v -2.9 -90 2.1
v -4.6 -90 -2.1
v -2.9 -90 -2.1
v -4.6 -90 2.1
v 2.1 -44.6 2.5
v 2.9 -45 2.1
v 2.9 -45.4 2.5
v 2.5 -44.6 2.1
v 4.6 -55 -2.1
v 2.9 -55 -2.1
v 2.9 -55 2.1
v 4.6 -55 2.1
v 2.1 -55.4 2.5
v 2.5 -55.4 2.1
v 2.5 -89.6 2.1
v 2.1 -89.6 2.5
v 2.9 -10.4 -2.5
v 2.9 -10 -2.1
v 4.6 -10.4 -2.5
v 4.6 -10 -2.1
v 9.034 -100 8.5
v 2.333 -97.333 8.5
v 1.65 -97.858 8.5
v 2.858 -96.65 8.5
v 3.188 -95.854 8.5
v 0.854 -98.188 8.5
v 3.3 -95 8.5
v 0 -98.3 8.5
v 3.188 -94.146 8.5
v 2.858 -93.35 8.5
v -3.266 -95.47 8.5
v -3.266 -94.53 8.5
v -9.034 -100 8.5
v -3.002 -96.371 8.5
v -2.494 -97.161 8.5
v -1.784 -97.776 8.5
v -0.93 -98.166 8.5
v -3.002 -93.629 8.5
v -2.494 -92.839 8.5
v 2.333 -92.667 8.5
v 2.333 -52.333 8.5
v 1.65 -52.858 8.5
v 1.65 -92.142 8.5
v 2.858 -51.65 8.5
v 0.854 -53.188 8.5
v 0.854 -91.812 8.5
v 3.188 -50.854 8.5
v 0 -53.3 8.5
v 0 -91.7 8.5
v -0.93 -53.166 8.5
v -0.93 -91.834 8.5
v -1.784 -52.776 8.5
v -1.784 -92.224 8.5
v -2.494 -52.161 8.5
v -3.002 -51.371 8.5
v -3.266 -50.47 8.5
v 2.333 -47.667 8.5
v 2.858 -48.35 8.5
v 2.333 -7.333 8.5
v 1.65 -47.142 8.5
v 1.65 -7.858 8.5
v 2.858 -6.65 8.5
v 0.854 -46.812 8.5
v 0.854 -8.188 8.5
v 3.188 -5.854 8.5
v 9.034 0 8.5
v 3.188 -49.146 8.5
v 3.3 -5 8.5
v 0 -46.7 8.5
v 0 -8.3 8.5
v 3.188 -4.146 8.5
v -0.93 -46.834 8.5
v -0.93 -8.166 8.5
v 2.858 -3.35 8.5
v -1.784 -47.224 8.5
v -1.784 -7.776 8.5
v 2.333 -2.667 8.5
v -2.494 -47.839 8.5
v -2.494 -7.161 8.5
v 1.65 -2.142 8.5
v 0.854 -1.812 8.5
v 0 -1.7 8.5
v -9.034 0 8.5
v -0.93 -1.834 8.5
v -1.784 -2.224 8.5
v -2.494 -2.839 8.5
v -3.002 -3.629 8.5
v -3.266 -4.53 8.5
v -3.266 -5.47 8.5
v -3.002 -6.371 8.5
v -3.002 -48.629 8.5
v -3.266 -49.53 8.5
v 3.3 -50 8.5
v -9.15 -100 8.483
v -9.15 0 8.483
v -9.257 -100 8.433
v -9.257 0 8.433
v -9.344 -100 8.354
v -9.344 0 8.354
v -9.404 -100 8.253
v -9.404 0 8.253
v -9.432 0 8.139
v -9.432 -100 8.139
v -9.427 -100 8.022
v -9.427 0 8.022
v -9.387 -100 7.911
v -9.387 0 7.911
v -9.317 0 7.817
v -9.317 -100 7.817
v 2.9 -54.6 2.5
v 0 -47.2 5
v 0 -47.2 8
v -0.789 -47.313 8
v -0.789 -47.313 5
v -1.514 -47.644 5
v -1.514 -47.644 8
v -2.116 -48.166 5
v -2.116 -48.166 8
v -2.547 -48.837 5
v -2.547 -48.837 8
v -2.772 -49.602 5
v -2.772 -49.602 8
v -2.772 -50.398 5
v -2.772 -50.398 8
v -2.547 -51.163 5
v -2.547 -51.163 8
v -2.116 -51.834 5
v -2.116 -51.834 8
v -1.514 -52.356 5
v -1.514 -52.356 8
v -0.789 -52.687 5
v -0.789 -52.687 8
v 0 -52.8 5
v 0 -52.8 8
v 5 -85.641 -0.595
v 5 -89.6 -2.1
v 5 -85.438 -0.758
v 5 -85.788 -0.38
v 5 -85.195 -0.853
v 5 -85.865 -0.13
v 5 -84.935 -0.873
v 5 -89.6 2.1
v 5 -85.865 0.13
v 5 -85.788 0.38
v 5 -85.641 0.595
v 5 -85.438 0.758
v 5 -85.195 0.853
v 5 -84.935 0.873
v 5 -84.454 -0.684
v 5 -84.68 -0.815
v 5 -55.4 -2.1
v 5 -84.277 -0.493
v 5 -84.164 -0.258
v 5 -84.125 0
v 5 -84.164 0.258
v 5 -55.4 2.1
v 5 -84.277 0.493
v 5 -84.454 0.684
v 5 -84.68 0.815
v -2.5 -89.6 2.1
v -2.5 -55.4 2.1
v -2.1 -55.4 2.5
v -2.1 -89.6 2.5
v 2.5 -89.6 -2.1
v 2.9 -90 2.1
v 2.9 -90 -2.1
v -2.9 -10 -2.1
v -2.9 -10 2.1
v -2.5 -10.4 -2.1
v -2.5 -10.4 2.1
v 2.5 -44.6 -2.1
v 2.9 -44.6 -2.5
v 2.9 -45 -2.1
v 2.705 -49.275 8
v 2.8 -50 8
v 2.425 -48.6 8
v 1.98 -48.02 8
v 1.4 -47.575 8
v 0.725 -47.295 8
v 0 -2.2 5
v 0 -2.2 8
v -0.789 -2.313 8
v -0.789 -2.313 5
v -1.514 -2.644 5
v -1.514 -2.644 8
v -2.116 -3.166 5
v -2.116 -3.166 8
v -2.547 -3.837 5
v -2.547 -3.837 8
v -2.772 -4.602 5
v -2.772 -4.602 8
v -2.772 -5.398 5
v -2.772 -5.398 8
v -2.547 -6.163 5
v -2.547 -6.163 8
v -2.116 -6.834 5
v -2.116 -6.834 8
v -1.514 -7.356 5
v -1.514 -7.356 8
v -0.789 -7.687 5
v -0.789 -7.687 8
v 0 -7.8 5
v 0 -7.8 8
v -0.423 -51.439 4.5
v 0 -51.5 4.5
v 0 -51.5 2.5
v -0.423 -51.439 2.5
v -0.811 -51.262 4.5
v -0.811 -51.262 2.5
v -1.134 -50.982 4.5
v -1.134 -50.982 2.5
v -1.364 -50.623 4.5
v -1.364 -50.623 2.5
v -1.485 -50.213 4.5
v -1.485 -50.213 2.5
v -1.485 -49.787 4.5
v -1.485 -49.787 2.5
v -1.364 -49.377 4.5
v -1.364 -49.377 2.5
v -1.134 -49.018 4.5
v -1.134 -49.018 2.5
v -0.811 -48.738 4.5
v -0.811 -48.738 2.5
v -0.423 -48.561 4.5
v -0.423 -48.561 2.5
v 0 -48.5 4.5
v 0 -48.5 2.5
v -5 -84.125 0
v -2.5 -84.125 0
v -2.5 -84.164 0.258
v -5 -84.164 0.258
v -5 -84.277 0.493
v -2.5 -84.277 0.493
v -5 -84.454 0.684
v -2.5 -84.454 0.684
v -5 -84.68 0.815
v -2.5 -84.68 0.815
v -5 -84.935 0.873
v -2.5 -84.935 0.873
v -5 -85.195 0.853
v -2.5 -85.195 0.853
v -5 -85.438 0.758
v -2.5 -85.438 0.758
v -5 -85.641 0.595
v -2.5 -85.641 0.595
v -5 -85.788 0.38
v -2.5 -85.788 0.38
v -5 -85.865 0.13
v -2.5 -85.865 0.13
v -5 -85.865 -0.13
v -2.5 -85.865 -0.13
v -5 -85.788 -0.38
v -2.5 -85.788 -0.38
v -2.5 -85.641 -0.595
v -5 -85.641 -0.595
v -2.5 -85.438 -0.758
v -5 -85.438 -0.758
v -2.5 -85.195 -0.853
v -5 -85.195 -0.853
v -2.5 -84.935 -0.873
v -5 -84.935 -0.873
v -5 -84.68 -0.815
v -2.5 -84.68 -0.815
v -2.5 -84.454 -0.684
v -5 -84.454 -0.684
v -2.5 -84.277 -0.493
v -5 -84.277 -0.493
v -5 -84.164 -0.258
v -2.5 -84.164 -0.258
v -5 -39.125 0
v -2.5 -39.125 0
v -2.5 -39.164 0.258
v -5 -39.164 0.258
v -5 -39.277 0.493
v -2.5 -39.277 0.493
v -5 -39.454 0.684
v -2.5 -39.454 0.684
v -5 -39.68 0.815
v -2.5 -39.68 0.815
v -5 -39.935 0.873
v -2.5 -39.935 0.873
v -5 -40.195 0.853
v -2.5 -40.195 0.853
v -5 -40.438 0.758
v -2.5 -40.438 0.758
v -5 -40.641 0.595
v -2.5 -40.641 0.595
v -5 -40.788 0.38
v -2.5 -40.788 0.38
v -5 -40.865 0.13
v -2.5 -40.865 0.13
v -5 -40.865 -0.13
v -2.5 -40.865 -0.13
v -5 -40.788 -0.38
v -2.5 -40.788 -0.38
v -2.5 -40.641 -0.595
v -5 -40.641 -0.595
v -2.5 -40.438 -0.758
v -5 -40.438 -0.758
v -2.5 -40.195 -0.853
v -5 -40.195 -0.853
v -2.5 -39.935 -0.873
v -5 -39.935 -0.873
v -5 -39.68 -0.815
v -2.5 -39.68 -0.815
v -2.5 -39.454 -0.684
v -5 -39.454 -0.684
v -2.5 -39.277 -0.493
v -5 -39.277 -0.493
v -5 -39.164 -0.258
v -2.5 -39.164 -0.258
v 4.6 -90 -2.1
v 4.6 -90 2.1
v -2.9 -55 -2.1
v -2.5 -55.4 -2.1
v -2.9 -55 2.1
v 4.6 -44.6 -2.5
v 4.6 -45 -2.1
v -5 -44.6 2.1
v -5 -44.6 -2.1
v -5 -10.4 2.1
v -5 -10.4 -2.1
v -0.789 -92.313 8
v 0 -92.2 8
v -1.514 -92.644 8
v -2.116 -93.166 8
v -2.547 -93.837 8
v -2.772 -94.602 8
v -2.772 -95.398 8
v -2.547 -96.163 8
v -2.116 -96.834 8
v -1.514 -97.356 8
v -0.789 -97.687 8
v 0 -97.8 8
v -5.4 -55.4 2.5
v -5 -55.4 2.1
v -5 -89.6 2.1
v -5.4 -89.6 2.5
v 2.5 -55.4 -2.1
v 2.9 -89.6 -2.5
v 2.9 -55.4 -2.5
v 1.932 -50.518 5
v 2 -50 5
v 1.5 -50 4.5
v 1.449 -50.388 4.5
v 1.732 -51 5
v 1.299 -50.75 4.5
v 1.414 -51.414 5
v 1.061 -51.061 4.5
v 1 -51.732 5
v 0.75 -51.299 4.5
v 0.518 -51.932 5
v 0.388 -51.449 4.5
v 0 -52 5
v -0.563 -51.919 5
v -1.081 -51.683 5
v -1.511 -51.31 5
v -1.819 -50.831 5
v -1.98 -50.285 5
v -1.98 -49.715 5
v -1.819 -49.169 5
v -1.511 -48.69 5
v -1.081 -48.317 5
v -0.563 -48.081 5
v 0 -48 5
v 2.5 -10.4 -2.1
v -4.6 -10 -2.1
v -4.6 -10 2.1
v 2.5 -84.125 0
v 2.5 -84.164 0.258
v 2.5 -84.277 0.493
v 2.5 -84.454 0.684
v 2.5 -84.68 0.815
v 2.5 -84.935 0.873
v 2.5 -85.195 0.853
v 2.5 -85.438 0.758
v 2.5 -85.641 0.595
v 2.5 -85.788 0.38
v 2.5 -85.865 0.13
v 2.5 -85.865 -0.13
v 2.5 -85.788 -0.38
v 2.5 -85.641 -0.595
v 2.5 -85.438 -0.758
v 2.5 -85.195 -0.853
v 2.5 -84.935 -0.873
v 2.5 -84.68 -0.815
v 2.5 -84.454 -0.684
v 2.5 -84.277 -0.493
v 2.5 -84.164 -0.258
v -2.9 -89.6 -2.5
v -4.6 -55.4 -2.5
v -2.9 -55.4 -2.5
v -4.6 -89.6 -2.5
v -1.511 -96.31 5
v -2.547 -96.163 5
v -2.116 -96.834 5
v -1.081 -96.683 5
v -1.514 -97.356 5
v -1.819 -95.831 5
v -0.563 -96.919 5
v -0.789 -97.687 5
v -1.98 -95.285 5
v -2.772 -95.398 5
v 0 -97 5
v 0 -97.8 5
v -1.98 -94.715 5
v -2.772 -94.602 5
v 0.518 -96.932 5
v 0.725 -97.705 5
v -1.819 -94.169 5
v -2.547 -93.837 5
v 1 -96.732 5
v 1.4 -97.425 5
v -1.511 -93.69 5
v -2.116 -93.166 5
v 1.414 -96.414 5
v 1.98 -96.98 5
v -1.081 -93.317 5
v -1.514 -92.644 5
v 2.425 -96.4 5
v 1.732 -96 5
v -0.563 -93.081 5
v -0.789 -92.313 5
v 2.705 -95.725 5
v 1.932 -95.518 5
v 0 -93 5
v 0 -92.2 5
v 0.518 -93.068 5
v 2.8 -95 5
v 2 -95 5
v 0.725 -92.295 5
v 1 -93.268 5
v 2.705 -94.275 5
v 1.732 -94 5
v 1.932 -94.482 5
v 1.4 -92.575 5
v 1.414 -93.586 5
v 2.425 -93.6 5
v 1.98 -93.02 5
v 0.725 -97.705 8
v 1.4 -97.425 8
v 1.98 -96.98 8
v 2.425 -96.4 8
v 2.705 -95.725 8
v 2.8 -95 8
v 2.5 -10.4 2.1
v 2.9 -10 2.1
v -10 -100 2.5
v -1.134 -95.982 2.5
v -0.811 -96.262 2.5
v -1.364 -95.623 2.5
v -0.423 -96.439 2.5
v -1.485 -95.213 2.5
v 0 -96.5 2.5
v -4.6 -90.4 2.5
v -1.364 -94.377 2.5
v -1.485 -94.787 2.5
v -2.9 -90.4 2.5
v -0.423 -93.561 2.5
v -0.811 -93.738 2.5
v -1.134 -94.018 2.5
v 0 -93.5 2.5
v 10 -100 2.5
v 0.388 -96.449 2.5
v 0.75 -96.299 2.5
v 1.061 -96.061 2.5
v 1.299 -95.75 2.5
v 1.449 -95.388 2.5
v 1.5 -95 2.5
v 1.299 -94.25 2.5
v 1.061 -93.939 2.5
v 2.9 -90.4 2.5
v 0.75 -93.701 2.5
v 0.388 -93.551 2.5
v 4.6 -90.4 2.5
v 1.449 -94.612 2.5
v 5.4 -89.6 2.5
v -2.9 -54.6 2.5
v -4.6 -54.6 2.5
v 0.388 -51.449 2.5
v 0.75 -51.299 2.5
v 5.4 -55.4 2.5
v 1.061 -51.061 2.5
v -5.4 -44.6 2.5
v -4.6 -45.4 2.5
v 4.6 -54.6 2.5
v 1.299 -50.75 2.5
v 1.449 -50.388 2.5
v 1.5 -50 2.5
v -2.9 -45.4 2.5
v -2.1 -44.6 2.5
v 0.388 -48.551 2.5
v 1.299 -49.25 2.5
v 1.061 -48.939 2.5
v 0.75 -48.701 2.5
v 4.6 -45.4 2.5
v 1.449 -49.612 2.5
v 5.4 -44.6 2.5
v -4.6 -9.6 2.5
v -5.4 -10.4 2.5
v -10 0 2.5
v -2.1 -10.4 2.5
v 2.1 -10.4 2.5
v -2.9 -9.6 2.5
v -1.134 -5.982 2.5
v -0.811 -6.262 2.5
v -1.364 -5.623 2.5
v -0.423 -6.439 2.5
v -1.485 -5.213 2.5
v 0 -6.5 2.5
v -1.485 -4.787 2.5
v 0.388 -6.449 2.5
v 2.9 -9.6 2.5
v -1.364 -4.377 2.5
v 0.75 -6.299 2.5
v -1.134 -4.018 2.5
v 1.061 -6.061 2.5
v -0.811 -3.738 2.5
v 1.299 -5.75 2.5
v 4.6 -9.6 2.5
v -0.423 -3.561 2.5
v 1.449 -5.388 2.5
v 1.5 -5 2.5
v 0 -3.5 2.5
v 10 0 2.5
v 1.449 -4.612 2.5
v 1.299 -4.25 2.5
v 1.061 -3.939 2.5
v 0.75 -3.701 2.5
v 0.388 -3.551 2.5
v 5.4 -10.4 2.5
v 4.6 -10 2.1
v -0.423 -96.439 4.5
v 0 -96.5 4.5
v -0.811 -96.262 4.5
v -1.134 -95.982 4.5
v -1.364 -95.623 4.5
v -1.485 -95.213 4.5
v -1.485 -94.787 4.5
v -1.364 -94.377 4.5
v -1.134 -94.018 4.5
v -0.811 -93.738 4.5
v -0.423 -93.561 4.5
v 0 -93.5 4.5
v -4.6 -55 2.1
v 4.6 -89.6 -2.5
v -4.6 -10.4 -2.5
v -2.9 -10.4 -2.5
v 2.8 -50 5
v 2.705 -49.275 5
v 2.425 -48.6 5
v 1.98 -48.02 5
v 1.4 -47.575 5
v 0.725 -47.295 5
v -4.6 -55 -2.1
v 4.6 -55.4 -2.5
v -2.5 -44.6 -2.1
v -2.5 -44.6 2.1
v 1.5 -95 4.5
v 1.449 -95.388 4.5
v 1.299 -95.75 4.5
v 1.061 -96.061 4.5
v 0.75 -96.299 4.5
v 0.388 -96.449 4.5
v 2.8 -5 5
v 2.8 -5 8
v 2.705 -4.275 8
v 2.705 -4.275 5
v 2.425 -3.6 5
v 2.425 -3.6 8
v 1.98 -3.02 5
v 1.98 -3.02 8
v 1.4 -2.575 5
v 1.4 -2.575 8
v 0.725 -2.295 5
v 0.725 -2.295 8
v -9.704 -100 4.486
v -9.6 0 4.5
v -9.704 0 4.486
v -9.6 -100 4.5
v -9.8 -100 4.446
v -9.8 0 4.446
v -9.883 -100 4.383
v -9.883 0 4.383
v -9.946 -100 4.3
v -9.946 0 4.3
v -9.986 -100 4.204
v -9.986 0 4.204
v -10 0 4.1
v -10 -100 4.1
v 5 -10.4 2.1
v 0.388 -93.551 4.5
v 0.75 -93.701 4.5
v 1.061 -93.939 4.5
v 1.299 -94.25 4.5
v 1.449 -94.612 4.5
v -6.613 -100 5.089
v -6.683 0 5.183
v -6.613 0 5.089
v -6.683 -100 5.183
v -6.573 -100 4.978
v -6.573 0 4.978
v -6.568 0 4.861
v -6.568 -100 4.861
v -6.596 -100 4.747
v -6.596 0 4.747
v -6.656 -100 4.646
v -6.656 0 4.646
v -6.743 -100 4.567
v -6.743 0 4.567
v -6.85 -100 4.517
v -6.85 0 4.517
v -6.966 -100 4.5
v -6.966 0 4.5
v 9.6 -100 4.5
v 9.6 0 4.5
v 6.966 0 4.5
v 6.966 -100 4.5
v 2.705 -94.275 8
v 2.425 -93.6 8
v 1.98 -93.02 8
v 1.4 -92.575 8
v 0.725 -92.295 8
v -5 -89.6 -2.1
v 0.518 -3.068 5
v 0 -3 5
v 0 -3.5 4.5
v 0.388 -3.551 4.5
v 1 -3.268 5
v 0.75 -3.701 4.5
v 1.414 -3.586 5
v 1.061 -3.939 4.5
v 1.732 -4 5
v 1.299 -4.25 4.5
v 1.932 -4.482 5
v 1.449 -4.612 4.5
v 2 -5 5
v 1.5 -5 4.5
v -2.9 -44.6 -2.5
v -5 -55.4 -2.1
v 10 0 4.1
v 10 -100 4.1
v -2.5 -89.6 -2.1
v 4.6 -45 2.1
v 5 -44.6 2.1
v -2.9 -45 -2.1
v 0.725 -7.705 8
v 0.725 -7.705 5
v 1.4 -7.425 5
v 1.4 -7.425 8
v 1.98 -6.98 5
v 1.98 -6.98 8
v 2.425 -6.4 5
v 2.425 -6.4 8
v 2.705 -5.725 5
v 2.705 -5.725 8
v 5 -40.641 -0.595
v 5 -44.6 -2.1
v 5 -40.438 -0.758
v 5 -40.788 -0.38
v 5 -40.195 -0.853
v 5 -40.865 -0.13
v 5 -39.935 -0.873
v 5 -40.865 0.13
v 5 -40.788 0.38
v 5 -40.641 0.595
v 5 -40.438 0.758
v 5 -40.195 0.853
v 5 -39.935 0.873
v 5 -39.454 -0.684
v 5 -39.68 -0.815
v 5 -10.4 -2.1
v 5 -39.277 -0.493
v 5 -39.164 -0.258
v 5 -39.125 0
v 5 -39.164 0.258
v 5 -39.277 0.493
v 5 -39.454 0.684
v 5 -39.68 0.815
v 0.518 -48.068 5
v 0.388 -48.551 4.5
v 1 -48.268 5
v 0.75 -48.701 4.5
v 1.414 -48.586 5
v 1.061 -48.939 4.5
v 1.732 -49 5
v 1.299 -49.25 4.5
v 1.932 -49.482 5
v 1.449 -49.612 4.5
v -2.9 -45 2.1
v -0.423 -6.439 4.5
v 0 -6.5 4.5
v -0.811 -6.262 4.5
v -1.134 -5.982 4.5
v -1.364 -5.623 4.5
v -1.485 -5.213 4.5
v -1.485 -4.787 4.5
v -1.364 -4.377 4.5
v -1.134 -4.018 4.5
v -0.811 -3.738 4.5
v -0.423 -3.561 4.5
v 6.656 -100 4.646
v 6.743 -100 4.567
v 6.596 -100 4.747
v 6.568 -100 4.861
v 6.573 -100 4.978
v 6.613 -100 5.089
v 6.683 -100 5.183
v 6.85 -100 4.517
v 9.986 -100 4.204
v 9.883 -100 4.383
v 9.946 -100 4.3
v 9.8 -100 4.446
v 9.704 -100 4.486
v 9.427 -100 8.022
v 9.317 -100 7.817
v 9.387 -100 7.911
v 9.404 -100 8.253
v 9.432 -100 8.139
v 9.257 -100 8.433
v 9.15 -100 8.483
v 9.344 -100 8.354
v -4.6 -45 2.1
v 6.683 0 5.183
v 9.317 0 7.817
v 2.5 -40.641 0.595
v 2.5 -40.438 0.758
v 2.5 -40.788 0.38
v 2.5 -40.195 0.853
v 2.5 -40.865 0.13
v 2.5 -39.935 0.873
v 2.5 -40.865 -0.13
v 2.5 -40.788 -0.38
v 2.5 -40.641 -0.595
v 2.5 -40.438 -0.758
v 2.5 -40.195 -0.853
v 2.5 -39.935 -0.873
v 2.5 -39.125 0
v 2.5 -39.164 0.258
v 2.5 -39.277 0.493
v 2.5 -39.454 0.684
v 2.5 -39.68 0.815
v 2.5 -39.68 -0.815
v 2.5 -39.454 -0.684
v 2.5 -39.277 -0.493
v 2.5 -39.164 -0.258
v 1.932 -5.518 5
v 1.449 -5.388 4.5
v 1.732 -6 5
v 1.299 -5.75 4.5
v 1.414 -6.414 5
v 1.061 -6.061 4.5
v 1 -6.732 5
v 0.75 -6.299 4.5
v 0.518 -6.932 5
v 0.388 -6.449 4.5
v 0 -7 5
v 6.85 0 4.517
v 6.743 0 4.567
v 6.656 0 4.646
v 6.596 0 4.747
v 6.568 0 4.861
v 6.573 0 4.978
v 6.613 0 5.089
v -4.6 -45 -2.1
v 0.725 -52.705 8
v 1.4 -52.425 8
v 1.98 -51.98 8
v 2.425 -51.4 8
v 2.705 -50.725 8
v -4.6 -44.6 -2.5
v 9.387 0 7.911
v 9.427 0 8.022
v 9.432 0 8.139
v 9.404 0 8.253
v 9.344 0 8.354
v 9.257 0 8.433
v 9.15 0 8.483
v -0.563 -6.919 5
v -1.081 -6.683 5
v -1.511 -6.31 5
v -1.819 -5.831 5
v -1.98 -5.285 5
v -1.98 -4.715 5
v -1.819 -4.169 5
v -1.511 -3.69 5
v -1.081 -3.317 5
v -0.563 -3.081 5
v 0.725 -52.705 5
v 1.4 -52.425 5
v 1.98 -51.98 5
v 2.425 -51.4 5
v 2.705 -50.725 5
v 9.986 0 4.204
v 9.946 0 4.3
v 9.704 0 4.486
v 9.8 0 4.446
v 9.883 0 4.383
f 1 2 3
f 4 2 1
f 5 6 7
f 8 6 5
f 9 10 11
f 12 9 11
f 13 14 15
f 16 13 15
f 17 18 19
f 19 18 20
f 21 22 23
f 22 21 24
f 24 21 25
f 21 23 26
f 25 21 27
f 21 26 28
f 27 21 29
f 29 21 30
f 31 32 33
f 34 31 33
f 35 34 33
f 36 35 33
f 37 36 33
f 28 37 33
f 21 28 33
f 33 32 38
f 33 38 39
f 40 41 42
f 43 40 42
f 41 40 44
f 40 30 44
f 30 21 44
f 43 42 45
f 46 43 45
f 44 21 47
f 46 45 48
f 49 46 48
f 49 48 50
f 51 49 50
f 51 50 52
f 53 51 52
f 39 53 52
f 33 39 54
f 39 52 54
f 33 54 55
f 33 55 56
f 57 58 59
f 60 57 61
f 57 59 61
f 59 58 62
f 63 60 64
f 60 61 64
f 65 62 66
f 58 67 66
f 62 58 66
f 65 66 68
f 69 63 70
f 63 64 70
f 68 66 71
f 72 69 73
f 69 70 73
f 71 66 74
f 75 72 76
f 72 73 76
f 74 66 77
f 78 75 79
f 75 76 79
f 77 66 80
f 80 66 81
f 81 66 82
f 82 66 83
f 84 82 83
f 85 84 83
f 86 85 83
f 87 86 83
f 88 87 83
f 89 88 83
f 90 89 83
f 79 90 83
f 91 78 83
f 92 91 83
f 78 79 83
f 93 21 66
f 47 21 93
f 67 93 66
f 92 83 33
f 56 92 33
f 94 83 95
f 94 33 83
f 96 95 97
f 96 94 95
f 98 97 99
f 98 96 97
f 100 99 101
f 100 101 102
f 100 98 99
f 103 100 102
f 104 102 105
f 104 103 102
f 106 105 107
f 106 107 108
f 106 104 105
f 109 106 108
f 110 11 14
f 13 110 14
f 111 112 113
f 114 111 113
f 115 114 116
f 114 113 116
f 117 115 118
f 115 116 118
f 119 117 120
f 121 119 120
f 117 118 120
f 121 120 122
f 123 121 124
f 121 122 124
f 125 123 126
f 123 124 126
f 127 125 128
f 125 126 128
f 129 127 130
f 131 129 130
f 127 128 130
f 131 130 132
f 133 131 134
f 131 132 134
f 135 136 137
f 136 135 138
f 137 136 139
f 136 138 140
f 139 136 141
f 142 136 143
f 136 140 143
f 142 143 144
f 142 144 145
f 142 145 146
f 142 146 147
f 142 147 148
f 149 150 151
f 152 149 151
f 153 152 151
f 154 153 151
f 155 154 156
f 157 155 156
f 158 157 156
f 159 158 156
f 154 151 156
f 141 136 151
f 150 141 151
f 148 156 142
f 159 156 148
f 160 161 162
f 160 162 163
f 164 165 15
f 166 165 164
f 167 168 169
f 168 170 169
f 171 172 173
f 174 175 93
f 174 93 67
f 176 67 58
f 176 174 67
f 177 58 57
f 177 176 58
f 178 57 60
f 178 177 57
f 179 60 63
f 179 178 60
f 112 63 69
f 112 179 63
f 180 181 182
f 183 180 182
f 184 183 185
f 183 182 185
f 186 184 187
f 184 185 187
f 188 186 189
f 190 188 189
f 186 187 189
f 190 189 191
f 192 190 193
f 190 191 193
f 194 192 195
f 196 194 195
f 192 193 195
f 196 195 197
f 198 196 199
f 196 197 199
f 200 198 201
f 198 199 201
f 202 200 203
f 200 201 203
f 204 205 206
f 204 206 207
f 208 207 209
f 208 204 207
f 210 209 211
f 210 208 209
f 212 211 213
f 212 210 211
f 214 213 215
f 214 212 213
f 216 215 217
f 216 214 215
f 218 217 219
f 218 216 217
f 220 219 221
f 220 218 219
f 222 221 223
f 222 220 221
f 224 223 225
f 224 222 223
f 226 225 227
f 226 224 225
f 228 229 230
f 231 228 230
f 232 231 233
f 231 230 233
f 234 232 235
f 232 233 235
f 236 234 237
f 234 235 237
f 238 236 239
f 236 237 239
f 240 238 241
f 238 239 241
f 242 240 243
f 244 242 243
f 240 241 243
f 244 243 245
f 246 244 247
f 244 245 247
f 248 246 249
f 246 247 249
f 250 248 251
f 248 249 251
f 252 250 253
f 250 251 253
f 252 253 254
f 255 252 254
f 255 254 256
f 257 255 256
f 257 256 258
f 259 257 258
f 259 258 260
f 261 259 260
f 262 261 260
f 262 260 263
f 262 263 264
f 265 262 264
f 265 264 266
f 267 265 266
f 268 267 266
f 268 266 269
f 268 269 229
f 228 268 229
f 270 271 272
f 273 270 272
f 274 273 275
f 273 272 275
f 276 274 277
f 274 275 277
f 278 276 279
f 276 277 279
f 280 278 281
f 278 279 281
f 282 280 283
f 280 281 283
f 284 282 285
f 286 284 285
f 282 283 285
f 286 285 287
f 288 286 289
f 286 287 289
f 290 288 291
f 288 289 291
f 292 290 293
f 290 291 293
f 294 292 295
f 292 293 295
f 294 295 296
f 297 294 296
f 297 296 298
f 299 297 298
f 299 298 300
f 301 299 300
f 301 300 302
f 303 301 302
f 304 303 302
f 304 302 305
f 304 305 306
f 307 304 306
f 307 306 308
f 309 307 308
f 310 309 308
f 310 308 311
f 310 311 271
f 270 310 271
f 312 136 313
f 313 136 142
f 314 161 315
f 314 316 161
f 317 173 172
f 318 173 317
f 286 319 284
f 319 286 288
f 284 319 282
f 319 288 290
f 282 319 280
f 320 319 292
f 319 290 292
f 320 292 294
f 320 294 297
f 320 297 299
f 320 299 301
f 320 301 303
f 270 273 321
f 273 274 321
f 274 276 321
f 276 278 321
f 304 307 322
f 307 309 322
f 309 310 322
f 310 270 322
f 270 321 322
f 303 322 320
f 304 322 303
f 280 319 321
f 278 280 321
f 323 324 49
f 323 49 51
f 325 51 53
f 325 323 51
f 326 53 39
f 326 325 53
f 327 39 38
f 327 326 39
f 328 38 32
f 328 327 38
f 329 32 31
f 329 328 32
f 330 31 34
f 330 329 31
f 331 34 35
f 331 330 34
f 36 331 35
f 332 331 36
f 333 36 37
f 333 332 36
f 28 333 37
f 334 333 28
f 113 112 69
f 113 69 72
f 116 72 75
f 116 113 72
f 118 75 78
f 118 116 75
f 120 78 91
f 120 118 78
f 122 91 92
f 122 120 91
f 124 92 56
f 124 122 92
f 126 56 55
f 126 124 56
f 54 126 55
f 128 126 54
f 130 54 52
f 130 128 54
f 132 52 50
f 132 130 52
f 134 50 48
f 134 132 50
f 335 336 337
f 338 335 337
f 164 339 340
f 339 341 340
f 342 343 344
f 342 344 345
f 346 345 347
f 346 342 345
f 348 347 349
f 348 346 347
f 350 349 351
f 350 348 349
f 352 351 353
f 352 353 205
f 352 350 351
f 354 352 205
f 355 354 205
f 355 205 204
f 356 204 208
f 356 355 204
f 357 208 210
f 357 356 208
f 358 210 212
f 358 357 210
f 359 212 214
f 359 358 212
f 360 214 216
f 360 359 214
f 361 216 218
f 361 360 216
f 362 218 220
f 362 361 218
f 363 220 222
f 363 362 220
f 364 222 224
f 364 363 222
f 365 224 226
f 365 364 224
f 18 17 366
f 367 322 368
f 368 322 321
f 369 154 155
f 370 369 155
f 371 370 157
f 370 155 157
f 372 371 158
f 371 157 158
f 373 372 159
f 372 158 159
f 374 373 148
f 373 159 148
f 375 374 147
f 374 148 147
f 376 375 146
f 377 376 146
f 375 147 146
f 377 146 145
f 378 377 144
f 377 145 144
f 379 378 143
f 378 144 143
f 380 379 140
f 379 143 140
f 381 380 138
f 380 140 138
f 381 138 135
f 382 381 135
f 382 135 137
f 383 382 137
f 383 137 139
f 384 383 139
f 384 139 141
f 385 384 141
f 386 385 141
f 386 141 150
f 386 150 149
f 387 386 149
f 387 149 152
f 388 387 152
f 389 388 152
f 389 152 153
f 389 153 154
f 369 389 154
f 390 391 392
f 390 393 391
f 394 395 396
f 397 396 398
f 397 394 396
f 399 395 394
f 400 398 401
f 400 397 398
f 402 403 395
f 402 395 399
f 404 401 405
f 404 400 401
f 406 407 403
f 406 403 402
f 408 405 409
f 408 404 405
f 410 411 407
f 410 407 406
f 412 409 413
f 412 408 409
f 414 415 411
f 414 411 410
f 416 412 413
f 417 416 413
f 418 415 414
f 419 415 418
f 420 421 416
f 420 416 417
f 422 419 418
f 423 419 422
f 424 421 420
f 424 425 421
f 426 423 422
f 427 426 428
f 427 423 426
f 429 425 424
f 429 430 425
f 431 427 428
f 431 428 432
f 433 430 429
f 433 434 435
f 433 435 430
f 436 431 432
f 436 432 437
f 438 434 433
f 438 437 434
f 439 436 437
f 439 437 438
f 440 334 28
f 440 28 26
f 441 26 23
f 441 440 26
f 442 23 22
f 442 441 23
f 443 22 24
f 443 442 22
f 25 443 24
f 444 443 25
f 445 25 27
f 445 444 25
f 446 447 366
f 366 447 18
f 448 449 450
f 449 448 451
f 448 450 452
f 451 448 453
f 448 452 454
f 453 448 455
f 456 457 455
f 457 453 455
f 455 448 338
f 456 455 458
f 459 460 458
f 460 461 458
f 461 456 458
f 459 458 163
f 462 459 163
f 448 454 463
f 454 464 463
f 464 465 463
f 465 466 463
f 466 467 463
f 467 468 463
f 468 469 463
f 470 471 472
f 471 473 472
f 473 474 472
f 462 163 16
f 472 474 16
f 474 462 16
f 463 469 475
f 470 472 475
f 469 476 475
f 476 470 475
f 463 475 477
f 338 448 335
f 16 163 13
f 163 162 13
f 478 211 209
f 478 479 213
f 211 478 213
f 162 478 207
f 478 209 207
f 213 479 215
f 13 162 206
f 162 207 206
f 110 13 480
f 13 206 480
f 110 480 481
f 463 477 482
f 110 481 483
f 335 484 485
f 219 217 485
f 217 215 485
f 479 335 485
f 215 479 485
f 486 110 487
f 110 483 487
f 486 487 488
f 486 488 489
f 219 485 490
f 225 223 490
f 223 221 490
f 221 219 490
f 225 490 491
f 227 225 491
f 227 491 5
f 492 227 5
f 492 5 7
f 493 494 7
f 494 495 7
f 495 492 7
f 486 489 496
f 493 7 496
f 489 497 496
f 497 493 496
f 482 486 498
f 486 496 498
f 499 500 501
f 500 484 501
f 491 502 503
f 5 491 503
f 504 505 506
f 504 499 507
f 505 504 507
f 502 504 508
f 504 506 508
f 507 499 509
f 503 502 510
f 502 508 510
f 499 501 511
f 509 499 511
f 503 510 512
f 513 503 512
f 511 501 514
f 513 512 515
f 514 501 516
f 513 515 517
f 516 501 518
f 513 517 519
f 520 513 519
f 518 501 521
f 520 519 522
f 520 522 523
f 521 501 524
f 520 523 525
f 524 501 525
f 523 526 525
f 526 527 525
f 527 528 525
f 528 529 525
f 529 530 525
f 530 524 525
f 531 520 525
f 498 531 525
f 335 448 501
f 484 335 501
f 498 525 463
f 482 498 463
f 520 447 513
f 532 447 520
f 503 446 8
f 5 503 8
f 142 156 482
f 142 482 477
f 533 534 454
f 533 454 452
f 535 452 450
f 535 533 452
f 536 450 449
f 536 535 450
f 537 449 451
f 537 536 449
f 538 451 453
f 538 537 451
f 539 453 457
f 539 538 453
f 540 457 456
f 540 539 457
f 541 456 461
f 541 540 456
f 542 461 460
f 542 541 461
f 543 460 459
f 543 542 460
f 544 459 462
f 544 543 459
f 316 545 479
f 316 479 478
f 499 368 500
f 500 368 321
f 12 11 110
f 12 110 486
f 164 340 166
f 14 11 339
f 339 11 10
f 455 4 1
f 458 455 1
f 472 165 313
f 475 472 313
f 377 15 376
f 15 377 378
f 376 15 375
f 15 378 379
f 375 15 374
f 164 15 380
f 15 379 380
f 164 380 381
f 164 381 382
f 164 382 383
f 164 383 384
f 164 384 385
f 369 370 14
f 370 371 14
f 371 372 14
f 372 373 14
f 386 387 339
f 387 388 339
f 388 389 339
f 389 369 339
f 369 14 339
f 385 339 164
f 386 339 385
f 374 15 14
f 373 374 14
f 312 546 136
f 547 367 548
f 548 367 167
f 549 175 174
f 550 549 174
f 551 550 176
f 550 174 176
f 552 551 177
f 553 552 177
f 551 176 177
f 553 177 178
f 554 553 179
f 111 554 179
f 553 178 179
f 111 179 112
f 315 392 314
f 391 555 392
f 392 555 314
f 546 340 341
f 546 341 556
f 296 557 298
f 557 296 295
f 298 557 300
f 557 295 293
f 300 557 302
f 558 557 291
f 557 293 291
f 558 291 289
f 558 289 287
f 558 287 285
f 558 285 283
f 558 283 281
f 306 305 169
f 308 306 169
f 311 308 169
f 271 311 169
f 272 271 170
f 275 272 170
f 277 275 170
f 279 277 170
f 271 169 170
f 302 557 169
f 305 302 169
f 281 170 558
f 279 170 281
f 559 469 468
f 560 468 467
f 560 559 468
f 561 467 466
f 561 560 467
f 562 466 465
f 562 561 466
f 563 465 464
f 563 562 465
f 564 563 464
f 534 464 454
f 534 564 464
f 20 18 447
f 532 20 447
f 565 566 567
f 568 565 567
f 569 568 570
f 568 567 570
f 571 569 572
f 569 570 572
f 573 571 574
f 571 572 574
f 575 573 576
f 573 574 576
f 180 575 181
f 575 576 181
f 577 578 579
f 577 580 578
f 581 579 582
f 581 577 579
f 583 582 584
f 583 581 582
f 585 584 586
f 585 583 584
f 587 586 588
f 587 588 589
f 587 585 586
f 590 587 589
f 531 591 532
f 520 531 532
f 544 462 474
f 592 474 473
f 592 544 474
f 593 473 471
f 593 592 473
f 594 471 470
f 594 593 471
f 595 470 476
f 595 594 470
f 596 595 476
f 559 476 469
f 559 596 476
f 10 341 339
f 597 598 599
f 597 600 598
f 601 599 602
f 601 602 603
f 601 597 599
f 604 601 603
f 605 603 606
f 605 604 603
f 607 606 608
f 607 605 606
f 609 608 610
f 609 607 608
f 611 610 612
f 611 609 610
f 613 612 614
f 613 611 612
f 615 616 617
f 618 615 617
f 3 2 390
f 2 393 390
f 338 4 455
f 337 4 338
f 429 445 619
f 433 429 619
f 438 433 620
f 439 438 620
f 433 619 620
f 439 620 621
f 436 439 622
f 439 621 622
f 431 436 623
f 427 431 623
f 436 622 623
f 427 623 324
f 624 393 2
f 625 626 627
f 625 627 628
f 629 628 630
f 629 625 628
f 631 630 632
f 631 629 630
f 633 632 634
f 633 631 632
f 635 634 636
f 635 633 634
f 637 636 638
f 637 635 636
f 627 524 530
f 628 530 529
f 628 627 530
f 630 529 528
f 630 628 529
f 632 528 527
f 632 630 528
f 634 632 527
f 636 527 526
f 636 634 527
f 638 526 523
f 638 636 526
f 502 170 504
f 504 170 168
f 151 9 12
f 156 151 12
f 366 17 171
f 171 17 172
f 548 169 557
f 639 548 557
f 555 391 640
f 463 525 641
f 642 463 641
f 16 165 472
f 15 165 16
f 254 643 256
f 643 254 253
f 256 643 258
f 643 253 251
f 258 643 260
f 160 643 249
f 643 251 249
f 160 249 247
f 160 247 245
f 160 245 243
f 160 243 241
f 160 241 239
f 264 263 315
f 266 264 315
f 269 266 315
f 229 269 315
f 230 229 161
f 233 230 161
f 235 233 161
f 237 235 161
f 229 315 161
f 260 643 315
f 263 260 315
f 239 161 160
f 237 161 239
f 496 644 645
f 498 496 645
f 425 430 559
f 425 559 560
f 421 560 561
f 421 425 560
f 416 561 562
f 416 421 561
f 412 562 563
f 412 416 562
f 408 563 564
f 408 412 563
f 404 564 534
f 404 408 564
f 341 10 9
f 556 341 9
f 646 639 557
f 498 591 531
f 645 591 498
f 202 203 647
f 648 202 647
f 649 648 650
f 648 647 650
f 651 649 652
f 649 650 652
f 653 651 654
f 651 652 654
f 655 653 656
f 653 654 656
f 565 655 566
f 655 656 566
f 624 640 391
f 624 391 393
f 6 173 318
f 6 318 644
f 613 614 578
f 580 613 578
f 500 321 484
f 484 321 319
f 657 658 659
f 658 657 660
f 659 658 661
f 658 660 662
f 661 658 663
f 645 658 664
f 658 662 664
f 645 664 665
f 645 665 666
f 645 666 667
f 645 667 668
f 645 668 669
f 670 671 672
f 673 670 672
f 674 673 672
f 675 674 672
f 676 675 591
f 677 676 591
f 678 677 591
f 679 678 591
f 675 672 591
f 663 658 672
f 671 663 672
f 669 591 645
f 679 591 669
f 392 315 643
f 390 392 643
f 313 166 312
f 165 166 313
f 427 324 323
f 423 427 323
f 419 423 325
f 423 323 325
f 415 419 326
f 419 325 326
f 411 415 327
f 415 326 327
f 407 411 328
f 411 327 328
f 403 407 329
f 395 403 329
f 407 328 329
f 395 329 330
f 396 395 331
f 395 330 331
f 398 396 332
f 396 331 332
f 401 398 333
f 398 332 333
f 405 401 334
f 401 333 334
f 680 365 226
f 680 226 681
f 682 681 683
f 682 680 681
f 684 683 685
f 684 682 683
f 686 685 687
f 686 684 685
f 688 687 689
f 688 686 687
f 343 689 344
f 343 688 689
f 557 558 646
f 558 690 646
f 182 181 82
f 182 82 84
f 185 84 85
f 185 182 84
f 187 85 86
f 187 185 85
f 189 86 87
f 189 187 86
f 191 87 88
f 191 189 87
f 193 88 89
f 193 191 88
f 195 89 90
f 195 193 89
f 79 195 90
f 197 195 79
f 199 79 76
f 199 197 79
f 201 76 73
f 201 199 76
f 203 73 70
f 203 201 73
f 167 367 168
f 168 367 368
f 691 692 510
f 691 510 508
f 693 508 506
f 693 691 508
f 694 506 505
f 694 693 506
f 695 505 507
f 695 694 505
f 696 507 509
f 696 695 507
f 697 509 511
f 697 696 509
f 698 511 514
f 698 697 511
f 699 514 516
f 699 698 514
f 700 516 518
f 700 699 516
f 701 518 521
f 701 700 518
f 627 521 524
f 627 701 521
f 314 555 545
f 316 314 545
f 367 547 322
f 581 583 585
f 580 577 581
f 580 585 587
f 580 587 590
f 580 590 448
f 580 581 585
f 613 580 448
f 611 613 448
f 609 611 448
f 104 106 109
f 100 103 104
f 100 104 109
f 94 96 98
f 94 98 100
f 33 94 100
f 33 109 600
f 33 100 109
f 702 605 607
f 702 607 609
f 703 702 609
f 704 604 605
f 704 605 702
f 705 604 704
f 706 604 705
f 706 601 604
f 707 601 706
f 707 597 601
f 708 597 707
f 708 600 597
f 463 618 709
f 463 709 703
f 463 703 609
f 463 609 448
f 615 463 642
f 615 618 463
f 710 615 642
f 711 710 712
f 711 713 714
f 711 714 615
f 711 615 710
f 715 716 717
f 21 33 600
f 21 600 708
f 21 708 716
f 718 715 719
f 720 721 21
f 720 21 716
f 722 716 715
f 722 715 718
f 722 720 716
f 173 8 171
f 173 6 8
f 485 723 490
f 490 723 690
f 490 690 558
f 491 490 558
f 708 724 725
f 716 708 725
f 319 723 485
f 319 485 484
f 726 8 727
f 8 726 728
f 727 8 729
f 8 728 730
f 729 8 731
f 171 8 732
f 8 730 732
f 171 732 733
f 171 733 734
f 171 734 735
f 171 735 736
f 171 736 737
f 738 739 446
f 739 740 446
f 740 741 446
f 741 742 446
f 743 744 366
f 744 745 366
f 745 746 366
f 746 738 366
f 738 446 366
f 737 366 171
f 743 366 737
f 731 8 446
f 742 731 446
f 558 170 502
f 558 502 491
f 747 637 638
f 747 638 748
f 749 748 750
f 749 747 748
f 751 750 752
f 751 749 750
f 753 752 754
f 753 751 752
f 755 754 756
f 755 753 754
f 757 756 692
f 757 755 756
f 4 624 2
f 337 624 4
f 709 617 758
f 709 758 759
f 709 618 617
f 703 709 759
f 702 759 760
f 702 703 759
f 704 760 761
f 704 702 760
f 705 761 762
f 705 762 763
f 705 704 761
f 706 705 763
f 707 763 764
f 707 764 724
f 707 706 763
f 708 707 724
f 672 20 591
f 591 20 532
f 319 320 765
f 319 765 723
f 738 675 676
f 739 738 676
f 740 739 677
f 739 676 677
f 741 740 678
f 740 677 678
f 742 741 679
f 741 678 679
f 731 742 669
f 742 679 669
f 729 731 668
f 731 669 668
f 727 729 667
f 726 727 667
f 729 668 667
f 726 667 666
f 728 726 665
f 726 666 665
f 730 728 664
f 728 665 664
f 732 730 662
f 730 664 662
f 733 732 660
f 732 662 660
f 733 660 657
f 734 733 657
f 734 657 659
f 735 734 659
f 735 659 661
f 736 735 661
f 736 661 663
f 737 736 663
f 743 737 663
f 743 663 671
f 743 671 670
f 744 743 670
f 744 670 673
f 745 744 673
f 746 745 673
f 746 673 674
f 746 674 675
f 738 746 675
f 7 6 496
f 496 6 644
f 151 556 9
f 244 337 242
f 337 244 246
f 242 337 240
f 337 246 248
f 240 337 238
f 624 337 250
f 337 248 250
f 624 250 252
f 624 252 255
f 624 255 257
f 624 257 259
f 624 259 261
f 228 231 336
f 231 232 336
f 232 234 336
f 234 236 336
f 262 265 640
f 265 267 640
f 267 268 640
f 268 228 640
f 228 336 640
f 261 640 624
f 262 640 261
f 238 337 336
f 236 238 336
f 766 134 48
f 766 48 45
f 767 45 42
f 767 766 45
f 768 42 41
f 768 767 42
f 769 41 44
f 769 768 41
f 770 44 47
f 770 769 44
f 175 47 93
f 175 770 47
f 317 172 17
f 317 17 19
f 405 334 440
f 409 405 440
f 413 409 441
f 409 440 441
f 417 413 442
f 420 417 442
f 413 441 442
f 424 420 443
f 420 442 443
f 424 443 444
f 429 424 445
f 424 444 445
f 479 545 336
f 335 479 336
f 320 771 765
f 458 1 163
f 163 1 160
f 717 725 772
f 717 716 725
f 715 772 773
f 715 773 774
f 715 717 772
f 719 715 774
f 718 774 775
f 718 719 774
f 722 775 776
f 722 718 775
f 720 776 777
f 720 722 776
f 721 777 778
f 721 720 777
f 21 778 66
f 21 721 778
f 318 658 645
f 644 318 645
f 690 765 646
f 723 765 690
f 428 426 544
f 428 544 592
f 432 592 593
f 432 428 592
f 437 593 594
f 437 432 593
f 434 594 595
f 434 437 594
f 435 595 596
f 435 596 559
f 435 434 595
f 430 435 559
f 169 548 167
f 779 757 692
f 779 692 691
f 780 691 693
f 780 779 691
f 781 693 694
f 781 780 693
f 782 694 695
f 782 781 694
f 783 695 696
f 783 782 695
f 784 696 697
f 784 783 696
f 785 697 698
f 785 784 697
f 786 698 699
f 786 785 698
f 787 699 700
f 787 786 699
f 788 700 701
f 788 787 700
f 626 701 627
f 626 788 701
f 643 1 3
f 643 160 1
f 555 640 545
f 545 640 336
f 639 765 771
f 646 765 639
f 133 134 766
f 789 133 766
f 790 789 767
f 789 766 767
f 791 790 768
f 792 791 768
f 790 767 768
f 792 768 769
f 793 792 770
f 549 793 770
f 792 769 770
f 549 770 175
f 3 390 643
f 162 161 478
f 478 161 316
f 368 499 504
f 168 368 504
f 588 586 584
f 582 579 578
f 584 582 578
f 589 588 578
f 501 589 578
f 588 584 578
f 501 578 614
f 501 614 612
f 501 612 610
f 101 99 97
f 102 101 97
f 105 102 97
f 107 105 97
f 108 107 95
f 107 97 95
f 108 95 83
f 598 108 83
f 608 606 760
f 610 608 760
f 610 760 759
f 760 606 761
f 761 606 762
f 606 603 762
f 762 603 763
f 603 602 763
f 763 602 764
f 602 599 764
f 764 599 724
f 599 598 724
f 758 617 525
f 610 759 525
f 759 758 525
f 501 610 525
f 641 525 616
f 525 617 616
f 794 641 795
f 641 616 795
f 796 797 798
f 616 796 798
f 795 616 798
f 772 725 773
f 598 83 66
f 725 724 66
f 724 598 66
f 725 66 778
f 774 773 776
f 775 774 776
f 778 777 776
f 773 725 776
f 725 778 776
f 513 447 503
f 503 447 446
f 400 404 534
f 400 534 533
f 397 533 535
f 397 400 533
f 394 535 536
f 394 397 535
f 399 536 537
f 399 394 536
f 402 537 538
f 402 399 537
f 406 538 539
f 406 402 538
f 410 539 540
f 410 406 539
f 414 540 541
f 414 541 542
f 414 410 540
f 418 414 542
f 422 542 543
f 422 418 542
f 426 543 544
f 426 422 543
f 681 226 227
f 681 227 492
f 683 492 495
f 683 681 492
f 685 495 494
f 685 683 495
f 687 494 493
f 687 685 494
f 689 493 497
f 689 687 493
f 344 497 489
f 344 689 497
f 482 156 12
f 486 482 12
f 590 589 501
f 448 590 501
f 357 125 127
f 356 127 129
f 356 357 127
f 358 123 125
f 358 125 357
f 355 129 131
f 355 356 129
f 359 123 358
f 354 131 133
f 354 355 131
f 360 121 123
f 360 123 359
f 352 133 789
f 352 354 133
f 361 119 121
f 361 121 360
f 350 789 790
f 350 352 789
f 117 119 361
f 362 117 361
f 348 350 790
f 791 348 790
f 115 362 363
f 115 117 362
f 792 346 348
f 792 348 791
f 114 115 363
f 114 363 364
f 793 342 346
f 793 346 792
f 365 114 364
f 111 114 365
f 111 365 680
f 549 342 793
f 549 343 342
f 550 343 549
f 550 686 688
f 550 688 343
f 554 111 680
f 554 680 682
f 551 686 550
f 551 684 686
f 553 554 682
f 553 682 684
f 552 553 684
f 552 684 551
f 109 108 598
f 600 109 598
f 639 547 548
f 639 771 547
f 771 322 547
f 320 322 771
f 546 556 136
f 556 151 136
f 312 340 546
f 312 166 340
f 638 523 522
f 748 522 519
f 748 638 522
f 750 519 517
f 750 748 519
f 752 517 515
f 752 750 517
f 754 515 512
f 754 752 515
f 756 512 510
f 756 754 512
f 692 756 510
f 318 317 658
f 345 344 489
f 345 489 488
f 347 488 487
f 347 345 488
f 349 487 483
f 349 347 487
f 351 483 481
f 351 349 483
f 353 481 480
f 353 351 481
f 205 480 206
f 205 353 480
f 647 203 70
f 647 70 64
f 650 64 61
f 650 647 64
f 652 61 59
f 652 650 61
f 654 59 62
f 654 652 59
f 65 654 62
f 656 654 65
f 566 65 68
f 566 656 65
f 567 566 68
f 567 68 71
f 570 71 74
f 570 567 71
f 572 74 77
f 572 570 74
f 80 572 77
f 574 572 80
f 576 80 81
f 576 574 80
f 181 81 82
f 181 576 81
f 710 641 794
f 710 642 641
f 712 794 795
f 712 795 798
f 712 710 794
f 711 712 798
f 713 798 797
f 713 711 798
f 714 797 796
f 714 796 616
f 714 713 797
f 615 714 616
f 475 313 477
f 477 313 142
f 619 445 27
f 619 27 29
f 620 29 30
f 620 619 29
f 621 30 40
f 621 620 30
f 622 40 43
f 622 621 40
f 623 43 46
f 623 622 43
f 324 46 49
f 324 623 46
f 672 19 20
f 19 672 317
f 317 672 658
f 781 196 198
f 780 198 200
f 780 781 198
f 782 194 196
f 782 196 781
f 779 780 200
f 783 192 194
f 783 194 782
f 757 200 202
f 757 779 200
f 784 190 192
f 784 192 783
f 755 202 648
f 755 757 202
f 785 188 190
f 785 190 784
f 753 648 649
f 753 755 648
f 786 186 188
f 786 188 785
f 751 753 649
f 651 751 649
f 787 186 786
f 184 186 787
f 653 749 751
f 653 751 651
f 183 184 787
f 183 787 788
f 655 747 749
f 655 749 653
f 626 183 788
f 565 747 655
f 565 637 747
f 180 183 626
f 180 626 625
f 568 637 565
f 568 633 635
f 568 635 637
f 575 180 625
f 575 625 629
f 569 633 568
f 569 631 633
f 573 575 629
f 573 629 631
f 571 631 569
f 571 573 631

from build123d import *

# Parameters (mm, degrees)
F1_DEPTH  = 100
F2_W      = 5
F2_H      = 10
F3_DEPTH  = 5
F4_R      = 0.875
F5_DEPTH  = 25
F6_R      = 0.4
F8_DEPTH  = 3.5
F9_DEPTH  = 11.001
F10_SIZE  = 0.5
F11_W     = 10
F11_H     = 5
F12_DEPTH = 25
F13_SIZE  = 0.4


with BuildPart() as f1:
    # F0 (on Front) → F1 (new body)
    with BuildSketch(Plane.XZ):
        Polygon((2.5, -2.5), (5, -2.5), (5, 2.5), (10, 2.5), (10, 4.5), (6, 4.5), (10, 8.5), (6, 8.5), (-6, 8.5), (-10, 8.5), (-6, 4.5), (-10, 4.5), (-10, 2.5), (-5, 2.5), (-5, -2.5), (-2.5, -2.5), (-2.5, 2.5), (2.5, 2.5), align=None)
    extrude(amount=F1_DEPTH)

    # F2 (on face) → F3 (join)
    with BuildSketch(Plane(origin=(0, 0, 2.5), x_dir=(1, 0, 0), z_dir=(0, 0, -1))):
        with Locations((0, 95)):
            Rectangle(F2_W, F2_H)
        Polygon((-2.5, 50), (-2.5, 45), (2.5, 45), (2.5, 50), (2.5, 55), (-2.5, 55), align=None)
        with Locations((0, 5)):
            Rectangle(F2_W, F2_H)
    extrude(amount=F3_DEPTH)

    # F4 (on face) → F5 (cut)
    with BuildSketch(Plane.YZ.offset(5)):
        with Locations((-85, 0)):
            Circle(F4_R)
        with Locations((-40, 0)):
            Circle(F4_R)
    extrude(amount=-F5_DEPTH, mode=Mode.SUBTRACT)

    # F6
    f6_edges = [f1.edges().sort_by_distance(p)[0] for p in [
        (10, -50, 4.5),
        (-10, -50, 4.5),
        (-6, -50, 4.5),
        (6, -50, 4.5),
        (10, -50, 8.5),
        (-10, -50, 8.5),
    ]]
    fillet(f6_edges, radius=F6_R)

    # F7 (on face) → F8 (cut)
    with BuildSketch(Plane.XY.offset(8.5)):
        with BuildLine():
            ThreePointArc((0, -92.2), (-2.8, -95), (0, -97.8))
            Line((0, -97.8), (0, -96.5))
            ThreePointArc((0, -96.5), (-1.5, -95), (0, -93.5))
            Line((0, -93.5), (0, -92.2))
        make_face()
        with BuildLine():
            ThreePointArc((0, -2.2), (-2.8, -5), (0, -7.8))
            Line((0, -7.8), (0, -6.5))
            ThreePointArc((0, -6.5), (-1.5, -5), (0, -3.5))
            Line((0, -3.5), (0, -2.2))
        make_face()
        with BuildLine():
            Line((0, -6.5), (0, -7.8))
            ThreePointArc((0, -7.8), (1.9798989873, -6.9798989873), (2.8, -5))
            ThreePointArc((2.8, -5), (1.9798989873, -3.0201010127), (0, -2.2))
            Line((0, -2.2), (0, -3.5))
            ThreePointArc((0, -3.5), (1.0606601718, -3.9393398282), (1.5, -5))
            ThreePointArc((1.5, -5), (1.0606601718, -6.0606601718), (0, -6.5))
        make_face()
        with BuildLine():
            ThreePointArc((0, -47.2), (-2.8, -50), (0, -52.8))
            Line((0, -52.8), (0, -51.5))
            ThreePointArc((0, -51.5), (-1.5, -50), (0, -48.5))
            Line((0, -48.5), (0, -47.2))
        make_face()
        with BuildLine():
            Line((0, -51.5), (0, -52.8))
            ThreePointArc((0, -52.8), (1.9798989873, -51.9798989873), (2.8, -50))
            ThreePointArc((2.8, -50), (1.9798989873, -48.0201010127), (0, -47.2))
            Line((0, -47.2), (0, -48.5))
            ThreePointArc((0, -48.5), (1.0606601718, -48.9393398282), (1.5, -50))
            ThreePointArc((1.5, -50), (1.0606601718, -51.0606601718), (0, -51.5))
        make_face()
        with BuildLine():
            Line((0, -96.5), (0, -97.8))
            ThreePointArc((0, -97.8), (1.9798989873, -96.9798989873), (2.8, -95))
            ThreePointArc((2.8, -95), (1.9798989873, -93.0201010127), (0, -92.2))
            Line((0, -92.2), (0, -93.5))
            ThreePointArc((0, -93.5), (1.0606601718, -93.9393398282), (1.5, -95))
            ThreePointArc((1.5, -95), (1.0606601718, -96.0606601718), (0, -96.5))
        make_face()
    extrude(amount=-F8_DEPTH, mode=Mode.SUBTRACT)

    # F9 (cut, through all): faces of the model
    f9_faces = [f1.faces().sort_by_distance(p)[0] for p in [
        (0, -5, 8.5),
        (0, -50, 8.5),
        (0, -95, 8.5),
    ]]
    extrude(f9_faces, amount=-F9_DEPTH, mode=Mode.SUBTRACT)

    # F10
    f10_edges = [f1.edges().sort_by_distance(p)[0] for p in [
        (0, -2.2, 8.5),
        (0, -47.2, 8.5),
        (0, -92.2, 8.5),
        (0, -6.5, 5),
        (0, -51.5, 5),
        (0, -96.5, 5),
        (0, -96.5, -2.5),
        (0, -51.5, -2.5),
        (0, -6.5, -2.5),
    ]]
    chamfer(f10_edges, length=F10_SIZE)

    # F11 (on face) → F12 (cut)
    with BuildSketch(Plane(origin=(-5, 0, 0), x_dir=(0, -1, 0), z_dir=(-1, 0, 0))):
        with Locations((5, 0)):
            Rectangle(F11_W, F11_H)
        with Locations((50, 0)):
            Rectangle(F11_W, F11_H)
        with Locations((95, 0)):
            Rectangle(F11_W, F11_H)
    extrude(amount=-F12_DEPTH, mode=Mode.SUBTRACT)

    # F13
    f13_edges = [f1.edges().sort_by_distance(p)[0] for p in [
        (5, -72.5, -2.5),
        (3.75, -90, -2.5),
        (2.5, -72.5, -2.5),
        (3.75, -55, -2.5),
        (-3.75, -55, -2.5),
        (-2.5, -72.5, -2.5),
        (-3.75, -90, -2.5),
        (-5, -72.5, -2.5),
        (-3.75, -10, -2.5),
        (-2.5, -27.5, -2.5),
        (-3.75, -45, -2.5),
        (-5, -27.5, -2.5),
        (5, -27.5, -2.5),
        (3.75, -45, -2.5),
        (2.5, -27.5, -2.5),
        (3.75, -10, -2.5),
        (2.5, -90, 0),
        (5, -90, 0),
        (3.75, -90, 2.5),
        (-5, -90, 0),
        (-2.5, -90, 0),
        (-3.75, -90, 2.5),
        (2.5, -45, 0),
        (5, -45, 0),
        (3.75, -45, 2.5),
        (-5, -45, 0),
        (-2.5, -45, 0),
        (-3.75, -45, 2.5),
        (2.5, -55, 0),
        (3.75, -55, 2.5),
        (5, -55, 0),
        (-5, -55, 0),
        (-3.75, -55, 2.5),
        (-2.5, -55, 0),
        (-5, -10, 0),
        (-3.75, -10, 2.5),
        (-2.5, -10, 0),
        (2.5, -10, 0),
        (3.75, -10, 2.5),
        (5, -10, 0),
        (5, -27.5, 2.5),
        (2.5, -27.5, 2.5),
        (-2.5, -27.5, 2.5),
        (-5, -27.5, 2.5),
        (5, -72.5, 2.5),
        (2.5, -72.5, 2.5),
        (-2.5, -72.5, 2.5),
        (-5, -72.5, 2.5),
    ]]
    chamfer(f13_edges, length=F13_SIZE)


solid = f1.part
